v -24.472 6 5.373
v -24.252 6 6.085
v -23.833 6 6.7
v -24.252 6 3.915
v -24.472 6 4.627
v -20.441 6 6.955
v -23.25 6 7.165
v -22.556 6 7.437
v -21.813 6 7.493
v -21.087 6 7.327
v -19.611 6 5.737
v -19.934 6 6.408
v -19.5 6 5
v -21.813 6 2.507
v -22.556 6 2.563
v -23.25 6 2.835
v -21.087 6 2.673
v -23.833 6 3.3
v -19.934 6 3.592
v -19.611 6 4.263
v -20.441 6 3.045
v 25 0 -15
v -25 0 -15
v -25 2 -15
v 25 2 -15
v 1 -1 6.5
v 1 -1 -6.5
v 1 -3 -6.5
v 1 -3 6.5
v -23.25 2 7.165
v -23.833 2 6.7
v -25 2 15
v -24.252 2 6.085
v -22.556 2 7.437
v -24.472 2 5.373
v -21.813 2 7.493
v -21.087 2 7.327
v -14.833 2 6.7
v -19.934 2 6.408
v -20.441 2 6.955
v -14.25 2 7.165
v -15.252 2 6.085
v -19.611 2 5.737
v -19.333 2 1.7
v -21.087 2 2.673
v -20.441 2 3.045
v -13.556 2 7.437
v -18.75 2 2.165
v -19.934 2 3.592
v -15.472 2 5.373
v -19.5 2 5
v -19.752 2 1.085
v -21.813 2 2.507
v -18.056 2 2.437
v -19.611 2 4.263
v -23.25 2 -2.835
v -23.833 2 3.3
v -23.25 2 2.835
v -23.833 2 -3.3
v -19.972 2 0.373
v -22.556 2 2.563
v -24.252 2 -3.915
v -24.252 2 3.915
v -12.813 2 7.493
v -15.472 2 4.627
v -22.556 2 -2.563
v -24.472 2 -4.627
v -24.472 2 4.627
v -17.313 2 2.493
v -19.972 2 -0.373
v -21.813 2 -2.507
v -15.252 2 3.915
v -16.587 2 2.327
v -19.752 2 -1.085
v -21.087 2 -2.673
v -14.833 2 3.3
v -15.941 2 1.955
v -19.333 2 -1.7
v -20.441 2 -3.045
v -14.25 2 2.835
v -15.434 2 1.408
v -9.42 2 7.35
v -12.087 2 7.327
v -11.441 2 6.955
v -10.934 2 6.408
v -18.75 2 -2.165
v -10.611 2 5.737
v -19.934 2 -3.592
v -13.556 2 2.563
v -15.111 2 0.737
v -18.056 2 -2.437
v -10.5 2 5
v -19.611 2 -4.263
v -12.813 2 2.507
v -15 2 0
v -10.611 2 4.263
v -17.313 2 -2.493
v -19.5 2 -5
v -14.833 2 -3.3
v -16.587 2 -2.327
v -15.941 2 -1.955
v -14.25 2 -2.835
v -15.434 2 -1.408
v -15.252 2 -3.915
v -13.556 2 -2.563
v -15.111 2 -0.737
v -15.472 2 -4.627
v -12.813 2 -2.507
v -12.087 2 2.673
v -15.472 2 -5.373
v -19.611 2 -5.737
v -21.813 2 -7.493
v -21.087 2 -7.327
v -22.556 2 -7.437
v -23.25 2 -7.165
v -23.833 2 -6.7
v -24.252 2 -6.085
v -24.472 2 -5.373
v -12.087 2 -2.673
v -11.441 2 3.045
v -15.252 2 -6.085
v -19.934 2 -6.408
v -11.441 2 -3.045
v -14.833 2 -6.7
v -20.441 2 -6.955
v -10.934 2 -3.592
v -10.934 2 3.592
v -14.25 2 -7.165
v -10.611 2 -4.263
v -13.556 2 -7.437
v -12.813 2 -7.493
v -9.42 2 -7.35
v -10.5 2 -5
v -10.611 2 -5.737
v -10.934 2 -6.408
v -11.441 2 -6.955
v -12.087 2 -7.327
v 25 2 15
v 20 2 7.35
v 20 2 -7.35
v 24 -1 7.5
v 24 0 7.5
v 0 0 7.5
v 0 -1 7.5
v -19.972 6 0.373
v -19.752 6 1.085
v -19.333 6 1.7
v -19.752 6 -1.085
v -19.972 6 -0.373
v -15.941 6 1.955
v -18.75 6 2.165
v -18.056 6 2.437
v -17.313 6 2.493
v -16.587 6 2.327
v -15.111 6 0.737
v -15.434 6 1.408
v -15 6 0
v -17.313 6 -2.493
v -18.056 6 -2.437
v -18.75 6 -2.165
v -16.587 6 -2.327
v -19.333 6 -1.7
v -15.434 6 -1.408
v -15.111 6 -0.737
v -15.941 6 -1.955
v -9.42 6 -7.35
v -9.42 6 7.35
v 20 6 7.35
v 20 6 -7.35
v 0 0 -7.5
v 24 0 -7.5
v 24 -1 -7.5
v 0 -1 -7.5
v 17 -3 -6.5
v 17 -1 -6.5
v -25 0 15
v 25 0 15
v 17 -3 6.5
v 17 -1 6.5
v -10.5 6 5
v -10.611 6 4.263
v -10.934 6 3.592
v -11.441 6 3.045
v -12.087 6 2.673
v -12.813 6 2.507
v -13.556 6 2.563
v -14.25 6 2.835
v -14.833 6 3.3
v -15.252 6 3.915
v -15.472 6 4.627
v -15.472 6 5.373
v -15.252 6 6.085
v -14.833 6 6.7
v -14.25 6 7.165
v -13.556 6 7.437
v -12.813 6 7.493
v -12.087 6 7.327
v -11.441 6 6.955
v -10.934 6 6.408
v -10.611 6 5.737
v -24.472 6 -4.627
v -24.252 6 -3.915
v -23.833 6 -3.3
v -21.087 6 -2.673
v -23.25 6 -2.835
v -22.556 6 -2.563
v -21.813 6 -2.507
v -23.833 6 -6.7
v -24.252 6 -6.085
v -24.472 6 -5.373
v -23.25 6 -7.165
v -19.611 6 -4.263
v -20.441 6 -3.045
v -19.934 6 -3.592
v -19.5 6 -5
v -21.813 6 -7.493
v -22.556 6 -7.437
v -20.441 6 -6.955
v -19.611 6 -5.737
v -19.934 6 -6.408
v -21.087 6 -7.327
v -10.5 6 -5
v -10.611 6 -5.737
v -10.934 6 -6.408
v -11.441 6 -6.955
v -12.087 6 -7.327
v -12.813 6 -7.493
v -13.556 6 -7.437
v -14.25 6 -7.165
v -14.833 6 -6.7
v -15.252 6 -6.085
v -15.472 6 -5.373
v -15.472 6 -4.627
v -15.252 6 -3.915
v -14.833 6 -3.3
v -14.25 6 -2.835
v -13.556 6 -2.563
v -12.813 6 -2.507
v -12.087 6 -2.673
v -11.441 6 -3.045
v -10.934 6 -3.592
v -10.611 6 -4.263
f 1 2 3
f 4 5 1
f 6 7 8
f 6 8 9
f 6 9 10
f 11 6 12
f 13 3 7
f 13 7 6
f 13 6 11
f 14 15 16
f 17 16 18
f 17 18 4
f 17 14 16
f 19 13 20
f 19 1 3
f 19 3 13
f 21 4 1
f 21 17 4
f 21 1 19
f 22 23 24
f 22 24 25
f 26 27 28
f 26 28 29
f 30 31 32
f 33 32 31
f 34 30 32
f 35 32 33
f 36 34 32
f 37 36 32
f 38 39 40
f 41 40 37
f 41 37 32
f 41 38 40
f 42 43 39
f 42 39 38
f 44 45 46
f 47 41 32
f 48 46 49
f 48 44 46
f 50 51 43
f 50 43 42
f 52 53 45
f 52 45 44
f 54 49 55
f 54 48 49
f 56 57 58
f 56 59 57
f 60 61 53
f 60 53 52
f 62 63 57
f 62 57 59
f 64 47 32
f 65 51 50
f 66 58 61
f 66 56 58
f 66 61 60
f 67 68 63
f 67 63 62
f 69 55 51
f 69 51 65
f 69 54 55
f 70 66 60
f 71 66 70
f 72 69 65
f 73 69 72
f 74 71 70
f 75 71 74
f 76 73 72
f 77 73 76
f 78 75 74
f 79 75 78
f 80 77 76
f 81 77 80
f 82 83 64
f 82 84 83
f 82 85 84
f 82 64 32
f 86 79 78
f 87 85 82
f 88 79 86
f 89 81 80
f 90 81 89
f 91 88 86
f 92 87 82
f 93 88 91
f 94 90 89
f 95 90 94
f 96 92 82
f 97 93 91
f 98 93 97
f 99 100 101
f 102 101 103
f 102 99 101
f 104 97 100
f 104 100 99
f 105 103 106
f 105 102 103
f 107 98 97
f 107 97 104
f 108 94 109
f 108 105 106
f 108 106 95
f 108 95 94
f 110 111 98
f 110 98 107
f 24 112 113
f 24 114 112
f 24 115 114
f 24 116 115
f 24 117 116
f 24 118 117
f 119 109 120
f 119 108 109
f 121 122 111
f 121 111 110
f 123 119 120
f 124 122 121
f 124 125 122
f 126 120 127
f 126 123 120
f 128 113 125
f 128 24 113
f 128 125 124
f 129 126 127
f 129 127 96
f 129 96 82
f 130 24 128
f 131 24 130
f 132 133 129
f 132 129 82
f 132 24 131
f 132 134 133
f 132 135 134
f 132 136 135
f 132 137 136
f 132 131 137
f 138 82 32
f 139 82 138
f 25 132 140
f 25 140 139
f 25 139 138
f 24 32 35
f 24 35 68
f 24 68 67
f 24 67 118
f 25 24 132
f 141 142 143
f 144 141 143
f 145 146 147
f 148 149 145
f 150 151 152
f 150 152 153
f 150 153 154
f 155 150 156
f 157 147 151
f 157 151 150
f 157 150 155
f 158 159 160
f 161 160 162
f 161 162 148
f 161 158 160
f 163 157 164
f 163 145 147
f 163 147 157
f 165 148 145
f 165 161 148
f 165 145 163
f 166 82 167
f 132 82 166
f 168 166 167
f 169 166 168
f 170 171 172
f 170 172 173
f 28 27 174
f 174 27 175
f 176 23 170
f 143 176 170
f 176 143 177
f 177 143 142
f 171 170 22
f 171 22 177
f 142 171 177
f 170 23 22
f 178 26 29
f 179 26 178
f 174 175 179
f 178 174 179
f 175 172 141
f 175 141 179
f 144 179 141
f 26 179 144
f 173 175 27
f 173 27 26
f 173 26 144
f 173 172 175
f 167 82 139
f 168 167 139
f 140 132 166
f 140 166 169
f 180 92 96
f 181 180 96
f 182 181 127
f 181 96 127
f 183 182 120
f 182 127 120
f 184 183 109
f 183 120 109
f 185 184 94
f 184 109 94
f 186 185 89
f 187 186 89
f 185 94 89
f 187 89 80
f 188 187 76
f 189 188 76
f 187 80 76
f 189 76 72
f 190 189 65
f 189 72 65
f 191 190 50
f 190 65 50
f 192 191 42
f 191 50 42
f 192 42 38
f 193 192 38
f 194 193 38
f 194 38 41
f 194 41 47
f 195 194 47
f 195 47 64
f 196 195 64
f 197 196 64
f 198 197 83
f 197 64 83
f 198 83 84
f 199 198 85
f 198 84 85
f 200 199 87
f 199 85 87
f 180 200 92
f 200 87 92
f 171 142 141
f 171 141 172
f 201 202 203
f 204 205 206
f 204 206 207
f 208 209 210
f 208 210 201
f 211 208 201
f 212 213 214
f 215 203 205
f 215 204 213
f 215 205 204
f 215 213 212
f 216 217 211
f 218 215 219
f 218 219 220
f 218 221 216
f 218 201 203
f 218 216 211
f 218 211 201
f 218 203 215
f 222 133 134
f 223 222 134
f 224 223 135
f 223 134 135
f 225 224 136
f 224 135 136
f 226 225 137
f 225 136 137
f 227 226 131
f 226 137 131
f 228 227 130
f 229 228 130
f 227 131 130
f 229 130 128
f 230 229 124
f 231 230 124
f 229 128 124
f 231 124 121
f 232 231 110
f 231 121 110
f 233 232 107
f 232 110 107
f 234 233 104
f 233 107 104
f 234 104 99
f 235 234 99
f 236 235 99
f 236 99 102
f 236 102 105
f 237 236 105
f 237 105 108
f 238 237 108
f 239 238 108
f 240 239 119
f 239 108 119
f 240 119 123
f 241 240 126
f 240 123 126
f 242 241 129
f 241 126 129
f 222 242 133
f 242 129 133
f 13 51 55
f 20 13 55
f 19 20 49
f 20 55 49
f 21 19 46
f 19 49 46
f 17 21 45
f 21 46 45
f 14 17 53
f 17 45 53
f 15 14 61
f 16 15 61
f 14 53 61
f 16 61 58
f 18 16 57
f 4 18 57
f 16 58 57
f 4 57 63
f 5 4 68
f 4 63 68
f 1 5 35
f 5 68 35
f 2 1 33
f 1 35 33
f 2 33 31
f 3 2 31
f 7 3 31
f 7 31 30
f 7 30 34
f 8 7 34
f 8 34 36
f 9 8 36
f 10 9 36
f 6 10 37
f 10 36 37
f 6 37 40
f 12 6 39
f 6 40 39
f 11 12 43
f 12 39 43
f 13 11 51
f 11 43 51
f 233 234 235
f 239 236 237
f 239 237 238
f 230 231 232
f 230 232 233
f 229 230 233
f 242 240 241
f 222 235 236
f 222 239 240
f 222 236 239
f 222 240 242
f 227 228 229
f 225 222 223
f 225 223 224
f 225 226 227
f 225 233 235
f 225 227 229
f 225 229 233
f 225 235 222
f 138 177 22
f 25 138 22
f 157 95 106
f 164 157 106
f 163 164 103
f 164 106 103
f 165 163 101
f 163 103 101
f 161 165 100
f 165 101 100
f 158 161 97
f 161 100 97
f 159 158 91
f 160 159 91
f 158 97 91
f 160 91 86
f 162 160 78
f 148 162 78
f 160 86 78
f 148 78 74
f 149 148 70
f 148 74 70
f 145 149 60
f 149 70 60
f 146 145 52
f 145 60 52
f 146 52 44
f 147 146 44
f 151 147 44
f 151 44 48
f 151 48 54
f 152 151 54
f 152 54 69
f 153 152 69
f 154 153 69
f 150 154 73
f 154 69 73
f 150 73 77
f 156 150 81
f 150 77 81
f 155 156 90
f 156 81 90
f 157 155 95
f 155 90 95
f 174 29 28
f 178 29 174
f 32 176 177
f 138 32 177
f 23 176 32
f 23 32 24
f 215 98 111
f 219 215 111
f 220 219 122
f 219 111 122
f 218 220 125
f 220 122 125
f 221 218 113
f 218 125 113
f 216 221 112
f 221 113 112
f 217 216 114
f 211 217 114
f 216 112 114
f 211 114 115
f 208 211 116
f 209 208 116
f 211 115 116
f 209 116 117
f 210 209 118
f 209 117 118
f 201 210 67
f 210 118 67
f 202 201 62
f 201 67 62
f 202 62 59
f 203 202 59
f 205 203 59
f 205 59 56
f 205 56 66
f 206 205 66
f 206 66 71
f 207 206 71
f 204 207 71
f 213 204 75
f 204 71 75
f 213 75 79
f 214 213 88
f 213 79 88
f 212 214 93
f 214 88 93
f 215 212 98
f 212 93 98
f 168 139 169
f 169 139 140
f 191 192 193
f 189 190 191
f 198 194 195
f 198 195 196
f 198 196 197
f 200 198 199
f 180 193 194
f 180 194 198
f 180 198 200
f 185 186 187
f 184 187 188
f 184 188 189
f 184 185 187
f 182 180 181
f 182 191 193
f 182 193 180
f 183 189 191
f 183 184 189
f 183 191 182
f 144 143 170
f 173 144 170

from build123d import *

# Parameters (mm, degrees)
SKETCH_1_W      = 50
SKETCH_1_H      = 30
EXTRUDE_1_DEPTH = 2
SKETCH_2_W      = 29.42
SKETCH_2_H      = 14.7
EXTRUDE_2_DEPTH = 4
SKETCH_3_W      = 24
SKETCH_3_H      = 15
EXTRUDE_3_DEPTH = 1
SKETCH_4_W      = 16
SKETCH_4_H      = 13
EXTRUDE_4_DEPTH = 2
SKETCH_5_R      = 2.5
EXTRUDE_5_DEPTH = 4


with BuildPart() as part:
    # 草图1 → 凸台-拉伸1 (new body)
    with BuildSketch(Plane(origin=(0, 0, 0), x_dir=(1, 0, 0), z_dir=(0, 1, 0))):
        Rectangle(SKETCH_1_W, SKETCH_1_H)
    extrude(amount=EXTRUDE_1_DEPTH)

    # 草图2 → 凸台-拉伸2 (add)
    with BuildSketch(Plane(origin=(0, 2, 0), x_dir=(1, 0, 0), z_dir=(0, 1, 0))):
        with Locations((5.29, 0)):
            Rectangle(SKETCH_2_W, SKETCH_2_H)
    extrude(amount=EXTRUDE_2_DEPTH)

    # 草图3 → 凸台-拉伸3 (add)
    with BuildSketch(Plane(origin=(0, 0, 0), x_dir=(-1, 0, 0), z_dir=(0, -1, 0))):
        with Locations((-12, 0)):
            Rectangle(SKETCH_3_W, SKETCH_3_H)
    extrude(amount=EXTRUDE_3_DEPTH)

    # 草图4 → 凸台-拉伸4 (add)
    with BuildSketch(Plane.XZ.offset(1)):
        with Locations((9, 0)):
            Rectangle(SKETCH_4_W, SKETCH_4_H)
    extrude(amount=EXTRUDE_4_DEPTH)

    # 草图5 → 凸台-拉伸5 (add)
    with BuildSketch(Plane(origin=(0, 2, 0), x_dir=(1, 0, 0), z_dir=(0, 1, 0))):
        with Locations((-22, 5)):
            Circle(SKETCH_5_R)
        with Locations((-22, -5)):
            Circle(SKETCH_5_R)
        with Locations((-13, -5)):
            Circle(SKETCH_5_R)
        with Locations((-13, 5)):
            Circle(SKETCH_5_R)
        with Locations((-17.5, 0)):
            Circle(SKETCH_5_R)
    extrude(amount=EXTRUDE_5_DEPTH)


solid = part.part
